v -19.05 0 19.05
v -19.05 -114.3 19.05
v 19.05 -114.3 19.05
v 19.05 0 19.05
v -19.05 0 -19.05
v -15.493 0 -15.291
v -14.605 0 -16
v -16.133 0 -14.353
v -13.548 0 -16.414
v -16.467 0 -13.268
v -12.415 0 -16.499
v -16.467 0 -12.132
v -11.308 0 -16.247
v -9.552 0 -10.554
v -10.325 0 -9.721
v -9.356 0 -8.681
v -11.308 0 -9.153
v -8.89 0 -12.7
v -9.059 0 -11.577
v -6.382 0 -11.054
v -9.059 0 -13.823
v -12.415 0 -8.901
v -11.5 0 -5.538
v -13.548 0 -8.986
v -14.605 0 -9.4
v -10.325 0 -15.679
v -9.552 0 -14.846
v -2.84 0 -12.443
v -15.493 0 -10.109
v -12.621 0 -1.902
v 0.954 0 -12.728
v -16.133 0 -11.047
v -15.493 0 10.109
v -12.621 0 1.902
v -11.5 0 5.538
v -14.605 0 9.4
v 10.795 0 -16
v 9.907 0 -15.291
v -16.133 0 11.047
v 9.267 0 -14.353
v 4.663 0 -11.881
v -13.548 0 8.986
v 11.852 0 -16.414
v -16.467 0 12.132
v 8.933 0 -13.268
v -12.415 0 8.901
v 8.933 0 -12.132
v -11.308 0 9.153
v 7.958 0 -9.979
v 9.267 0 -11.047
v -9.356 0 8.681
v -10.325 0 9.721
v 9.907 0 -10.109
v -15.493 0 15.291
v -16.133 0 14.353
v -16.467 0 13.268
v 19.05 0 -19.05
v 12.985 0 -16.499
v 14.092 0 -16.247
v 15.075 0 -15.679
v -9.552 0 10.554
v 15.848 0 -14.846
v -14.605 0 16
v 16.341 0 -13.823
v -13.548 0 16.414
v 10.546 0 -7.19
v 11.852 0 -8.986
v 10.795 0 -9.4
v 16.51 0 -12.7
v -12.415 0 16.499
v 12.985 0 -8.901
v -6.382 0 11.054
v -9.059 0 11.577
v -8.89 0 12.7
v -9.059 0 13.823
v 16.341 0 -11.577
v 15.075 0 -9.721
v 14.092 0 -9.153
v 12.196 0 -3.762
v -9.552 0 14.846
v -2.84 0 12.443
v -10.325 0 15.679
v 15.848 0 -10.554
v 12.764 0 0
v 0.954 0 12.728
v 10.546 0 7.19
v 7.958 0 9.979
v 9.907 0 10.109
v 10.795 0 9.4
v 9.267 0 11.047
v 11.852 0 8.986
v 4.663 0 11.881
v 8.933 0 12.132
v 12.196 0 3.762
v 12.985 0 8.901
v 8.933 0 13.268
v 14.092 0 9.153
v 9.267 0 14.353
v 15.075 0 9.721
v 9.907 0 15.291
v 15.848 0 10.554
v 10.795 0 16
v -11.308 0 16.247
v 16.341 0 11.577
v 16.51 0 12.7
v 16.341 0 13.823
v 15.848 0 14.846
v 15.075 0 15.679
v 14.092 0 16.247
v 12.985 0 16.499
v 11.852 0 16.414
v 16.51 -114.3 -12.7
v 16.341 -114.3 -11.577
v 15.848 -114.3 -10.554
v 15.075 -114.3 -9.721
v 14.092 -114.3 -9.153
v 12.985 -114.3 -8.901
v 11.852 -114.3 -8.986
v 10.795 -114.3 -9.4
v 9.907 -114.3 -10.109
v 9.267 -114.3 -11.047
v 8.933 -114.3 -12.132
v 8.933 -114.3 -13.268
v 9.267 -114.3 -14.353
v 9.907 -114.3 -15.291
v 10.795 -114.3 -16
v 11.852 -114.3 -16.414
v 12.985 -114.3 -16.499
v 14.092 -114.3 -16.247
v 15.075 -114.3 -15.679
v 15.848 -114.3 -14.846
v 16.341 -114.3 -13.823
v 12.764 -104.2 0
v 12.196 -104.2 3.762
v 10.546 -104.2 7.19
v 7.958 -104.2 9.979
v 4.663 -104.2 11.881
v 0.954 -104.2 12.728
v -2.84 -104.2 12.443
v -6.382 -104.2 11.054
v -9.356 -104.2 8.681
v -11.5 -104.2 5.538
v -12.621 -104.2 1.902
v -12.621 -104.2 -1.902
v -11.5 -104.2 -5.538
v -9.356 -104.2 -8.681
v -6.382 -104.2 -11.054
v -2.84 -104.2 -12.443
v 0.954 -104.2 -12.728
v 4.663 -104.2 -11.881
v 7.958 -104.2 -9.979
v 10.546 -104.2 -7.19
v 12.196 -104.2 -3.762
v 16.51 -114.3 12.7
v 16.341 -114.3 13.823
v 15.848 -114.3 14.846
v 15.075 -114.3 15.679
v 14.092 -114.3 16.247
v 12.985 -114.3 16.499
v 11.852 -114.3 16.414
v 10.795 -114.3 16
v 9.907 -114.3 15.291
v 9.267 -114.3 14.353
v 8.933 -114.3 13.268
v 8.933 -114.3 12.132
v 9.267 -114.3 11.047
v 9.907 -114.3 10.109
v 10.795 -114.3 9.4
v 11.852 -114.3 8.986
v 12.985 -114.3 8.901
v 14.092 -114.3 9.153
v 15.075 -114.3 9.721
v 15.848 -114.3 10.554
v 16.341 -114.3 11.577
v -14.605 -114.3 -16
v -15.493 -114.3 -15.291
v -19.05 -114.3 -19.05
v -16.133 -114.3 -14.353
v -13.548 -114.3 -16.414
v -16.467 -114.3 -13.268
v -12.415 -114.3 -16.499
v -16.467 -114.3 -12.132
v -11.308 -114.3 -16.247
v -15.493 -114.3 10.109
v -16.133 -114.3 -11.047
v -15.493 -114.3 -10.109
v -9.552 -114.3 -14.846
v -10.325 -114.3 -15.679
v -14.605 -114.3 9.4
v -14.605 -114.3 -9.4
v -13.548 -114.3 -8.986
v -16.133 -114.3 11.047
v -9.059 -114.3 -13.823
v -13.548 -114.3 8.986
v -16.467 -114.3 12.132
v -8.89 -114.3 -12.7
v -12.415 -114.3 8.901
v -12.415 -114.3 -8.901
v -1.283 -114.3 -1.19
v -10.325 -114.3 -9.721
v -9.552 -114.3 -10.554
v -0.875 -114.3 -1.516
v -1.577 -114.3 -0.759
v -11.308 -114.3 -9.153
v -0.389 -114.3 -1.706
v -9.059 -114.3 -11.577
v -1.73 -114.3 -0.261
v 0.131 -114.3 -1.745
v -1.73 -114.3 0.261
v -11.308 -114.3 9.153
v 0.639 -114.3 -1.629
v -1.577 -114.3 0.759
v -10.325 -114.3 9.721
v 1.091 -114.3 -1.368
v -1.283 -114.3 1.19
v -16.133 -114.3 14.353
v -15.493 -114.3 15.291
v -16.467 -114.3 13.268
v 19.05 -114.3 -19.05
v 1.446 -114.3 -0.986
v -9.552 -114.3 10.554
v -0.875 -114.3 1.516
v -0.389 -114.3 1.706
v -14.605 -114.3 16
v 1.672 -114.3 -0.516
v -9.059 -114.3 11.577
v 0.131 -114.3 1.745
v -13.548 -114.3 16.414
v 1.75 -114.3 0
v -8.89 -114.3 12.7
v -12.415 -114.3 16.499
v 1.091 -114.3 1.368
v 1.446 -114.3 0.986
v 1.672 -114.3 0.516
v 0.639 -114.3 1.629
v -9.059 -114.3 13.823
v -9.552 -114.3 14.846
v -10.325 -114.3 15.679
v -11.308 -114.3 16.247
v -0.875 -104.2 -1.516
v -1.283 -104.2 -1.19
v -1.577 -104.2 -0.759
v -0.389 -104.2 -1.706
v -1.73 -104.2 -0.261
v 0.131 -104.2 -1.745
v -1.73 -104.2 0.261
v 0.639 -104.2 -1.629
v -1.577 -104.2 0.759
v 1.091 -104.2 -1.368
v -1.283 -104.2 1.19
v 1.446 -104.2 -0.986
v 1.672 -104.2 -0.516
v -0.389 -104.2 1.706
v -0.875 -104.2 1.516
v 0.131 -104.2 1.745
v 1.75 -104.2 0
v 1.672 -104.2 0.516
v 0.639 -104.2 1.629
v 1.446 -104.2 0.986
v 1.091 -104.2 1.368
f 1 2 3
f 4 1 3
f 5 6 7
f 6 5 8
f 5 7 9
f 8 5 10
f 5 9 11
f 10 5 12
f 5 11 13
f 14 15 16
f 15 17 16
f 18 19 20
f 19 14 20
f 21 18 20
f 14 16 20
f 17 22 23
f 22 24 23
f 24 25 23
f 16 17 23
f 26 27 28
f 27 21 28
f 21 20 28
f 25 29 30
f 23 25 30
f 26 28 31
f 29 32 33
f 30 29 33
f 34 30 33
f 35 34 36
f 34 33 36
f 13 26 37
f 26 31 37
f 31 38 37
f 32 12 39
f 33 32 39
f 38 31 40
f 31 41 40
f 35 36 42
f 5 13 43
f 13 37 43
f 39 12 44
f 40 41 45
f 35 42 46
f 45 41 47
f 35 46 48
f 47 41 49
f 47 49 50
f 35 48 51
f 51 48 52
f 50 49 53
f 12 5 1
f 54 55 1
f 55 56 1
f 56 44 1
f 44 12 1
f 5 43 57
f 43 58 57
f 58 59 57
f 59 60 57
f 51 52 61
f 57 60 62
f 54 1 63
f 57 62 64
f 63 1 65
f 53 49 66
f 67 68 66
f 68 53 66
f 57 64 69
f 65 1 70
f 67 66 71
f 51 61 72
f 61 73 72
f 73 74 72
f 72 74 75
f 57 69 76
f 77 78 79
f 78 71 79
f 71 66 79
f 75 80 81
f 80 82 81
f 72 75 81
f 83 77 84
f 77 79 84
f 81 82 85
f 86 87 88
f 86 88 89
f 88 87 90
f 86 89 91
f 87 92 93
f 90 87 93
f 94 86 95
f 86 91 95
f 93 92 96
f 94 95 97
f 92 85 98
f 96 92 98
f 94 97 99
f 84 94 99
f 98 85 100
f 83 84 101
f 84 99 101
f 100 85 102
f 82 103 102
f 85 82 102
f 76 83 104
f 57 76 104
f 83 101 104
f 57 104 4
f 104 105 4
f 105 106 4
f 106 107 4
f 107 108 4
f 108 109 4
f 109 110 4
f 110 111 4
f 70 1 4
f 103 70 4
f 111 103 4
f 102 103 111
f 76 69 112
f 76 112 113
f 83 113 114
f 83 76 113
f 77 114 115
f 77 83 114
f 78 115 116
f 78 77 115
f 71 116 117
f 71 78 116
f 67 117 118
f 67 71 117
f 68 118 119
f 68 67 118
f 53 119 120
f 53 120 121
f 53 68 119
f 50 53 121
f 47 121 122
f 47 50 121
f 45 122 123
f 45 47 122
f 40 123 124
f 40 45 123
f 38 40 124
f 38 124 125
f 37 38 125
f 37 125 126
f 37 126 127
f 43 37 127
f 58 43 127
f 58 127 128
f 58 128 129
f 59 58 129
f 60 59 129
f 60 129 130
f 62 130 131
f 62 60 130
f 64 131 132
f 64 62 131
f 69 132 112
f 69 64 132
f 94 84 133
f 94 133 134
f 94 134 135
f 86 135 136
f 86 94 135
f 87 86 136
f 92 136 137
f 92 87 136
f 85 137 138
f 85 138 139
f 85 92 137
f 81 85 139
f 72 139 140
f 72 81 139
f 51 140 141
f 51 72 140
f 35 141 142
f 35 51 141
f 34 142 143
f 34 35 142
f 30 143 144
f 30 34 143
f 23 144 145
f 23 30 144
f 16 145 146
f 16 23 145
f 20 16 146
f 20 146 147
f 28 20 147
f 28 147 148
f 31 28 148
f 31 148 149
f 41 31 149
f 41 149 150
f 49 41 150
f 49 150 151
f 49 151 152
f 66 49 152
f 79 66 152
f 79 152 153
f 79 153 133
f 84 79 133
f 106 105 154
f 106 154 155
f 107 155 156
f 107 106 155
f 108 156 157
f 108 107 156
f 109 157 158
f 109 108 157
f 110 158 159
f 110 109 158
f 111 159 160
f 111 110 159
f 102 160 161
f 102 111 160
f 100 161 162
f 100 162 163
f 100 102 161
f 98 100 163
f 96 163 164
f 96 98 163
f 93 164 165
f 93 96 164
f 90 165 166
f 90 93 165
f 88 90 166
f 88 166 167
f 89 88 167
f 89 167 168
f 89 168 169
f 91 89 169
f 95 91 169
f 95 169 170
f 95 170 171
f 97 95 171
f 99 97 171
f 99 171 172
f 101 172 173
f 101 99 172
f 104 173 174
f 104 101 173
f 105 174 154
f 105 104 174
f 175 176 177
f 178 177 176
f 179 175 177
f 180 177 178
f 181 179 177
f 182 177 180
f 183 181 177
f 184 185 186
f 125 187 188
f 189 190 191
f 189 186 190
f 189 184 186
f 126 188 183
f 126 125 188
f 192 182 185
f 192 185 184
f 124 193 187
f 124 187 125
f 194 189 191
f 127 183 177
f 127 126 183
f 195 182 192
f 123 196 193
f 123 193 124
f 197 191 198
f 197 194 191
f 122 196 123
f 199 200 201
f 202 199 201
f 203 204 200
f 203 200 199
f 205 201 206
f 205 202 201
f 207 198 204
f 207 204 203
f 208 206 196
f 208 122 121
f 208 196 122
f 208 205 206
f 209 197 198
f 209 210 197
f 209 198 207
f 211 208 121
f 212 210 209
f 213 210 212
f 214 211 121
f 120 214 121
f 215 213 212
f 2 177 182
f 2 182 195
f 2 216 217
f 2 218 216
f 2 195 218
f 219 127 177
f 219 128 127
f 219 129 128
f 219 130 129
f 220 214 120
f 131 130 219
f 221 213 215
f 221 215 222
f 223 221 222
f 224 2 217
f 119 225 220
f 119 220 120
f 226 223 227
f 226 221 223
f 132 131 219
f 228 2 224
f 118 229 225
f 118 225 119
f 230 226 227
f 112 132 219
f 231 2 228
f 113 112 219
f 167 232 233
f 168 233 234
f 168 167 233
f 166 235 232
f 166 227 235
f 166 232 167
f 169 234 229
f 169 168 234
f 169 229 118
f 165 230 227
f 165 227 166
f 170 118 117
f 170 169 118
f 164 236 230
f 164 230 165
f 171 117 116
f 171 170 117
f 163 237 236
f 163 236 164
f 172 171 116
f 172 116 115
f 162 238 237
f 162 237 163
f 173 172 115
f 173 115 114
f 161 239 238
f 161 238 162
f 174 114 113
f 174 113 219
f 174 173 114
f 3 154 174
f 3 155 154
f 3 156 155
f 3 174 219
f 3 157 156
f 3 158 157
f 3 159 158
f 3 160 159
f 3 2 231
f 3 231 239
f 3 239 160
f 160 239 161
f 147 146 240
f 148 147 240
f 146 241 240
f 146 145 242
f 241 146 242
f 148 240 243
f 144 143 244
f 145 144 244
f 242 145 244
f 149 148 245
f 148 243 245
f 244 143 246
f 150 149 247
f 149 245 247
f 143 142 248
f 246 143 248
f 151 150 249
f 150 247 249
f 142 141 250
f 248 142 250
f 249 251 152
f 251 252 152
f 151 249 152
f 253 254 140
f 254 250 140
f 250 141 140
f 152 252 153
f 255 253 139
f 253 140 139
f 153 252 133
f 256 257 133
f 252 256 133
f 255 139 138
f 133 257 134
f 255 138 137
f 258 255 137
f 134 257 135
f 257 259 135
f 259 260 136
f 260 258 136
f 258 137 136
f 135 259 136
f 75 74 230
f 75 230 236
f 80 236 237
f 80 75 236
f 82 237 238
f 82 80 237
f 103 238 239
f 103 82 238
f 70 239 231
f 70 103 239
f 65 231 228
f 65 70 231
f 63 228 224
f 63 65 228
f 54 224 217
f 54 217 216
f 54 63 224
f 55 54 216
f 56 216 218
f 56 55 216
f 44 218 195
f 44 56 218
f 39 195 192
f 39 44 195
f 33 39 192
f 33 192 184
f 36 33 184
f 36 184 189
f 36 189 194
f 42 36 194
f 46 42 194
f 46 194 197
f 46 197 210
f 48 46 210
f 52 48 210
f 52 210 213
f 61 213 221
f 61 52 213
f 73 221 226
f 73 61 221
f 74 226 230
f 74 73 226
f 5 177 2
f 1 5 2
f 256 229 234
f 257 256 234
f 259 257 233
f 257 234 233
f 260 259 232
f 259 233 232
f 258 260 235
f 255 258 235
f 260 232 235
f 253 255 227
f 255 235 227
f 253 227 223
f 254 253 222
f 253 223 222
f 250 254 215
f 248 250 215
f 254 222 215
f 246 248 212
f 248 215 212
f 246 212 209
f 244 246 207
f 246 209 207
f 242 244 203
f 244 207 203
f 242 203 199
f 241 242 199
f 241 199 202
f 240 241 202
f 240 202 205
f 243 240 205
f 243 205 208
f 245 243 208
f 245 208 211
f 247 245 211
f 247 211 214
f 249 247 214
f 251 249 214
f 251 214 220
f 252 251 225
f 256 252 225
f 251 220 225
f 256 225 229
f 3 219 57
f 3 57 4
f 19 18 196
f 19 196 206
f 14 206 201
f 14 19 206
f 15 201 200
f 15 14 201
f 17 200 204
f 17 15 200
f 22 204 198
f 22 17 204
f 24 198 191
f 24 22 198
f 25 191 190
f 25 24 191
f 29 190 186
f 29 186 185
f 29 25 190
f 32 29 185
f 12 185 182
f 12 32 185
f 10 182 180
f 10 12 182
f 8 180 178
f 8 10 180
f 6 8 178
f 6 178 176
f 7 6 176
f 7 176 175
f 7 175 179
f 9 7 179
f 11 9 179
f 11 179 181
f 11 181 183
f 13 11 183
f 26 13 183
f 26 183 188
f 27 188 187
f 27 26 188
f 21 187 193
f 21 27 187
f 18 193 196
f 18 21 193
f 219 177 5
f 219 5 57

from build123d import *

# Parameters (mm, degrees)
F0_W     = 38.1
F0_H     = 38.1
F0_R     = 3.81
F0_R_2   = 12.7635
F1_DEPTH = 114.3
F2_R     = 12.7635
F2_R_2   = 1.75
F3_DEPTH = 10.1


with BuildPart() as f1:
    # F0 (on Front) → F1 (new body)
    with BuildSketch(Plane.XZ):
        Rectangle(F0_W, F0_H)
        with Locations((-12.7, -12.7)):
            Circle(F0_R, mode=Mode.SUBTRACT)
        with Locations((12.7, -12.7)):
            Circle(F0_R, mode=Mode.SUBTRACT)
        with Locations((-12.7, 12.7)):
            Circle(F0_R, mode=Mode.SUBTRACT)
        Circle(F0_R_2, mode=Mode.SUBTRACT)
        with Locations((12.7, 12.7)):
            Circle(F0_R, mode=Mode.SUBTRACT)
    extrude(amount=F1_DEPTH)

    # F2 (on face) → F3 (join)
    with BuildSketch(Plane.XZ.offset(114.3)):
        Circle(F2_R)
        Circle(F2_R_2, mode=Mode.SUBTRACT)
    extrude(amount=-F3_DEPTH)


solid = f1.part
